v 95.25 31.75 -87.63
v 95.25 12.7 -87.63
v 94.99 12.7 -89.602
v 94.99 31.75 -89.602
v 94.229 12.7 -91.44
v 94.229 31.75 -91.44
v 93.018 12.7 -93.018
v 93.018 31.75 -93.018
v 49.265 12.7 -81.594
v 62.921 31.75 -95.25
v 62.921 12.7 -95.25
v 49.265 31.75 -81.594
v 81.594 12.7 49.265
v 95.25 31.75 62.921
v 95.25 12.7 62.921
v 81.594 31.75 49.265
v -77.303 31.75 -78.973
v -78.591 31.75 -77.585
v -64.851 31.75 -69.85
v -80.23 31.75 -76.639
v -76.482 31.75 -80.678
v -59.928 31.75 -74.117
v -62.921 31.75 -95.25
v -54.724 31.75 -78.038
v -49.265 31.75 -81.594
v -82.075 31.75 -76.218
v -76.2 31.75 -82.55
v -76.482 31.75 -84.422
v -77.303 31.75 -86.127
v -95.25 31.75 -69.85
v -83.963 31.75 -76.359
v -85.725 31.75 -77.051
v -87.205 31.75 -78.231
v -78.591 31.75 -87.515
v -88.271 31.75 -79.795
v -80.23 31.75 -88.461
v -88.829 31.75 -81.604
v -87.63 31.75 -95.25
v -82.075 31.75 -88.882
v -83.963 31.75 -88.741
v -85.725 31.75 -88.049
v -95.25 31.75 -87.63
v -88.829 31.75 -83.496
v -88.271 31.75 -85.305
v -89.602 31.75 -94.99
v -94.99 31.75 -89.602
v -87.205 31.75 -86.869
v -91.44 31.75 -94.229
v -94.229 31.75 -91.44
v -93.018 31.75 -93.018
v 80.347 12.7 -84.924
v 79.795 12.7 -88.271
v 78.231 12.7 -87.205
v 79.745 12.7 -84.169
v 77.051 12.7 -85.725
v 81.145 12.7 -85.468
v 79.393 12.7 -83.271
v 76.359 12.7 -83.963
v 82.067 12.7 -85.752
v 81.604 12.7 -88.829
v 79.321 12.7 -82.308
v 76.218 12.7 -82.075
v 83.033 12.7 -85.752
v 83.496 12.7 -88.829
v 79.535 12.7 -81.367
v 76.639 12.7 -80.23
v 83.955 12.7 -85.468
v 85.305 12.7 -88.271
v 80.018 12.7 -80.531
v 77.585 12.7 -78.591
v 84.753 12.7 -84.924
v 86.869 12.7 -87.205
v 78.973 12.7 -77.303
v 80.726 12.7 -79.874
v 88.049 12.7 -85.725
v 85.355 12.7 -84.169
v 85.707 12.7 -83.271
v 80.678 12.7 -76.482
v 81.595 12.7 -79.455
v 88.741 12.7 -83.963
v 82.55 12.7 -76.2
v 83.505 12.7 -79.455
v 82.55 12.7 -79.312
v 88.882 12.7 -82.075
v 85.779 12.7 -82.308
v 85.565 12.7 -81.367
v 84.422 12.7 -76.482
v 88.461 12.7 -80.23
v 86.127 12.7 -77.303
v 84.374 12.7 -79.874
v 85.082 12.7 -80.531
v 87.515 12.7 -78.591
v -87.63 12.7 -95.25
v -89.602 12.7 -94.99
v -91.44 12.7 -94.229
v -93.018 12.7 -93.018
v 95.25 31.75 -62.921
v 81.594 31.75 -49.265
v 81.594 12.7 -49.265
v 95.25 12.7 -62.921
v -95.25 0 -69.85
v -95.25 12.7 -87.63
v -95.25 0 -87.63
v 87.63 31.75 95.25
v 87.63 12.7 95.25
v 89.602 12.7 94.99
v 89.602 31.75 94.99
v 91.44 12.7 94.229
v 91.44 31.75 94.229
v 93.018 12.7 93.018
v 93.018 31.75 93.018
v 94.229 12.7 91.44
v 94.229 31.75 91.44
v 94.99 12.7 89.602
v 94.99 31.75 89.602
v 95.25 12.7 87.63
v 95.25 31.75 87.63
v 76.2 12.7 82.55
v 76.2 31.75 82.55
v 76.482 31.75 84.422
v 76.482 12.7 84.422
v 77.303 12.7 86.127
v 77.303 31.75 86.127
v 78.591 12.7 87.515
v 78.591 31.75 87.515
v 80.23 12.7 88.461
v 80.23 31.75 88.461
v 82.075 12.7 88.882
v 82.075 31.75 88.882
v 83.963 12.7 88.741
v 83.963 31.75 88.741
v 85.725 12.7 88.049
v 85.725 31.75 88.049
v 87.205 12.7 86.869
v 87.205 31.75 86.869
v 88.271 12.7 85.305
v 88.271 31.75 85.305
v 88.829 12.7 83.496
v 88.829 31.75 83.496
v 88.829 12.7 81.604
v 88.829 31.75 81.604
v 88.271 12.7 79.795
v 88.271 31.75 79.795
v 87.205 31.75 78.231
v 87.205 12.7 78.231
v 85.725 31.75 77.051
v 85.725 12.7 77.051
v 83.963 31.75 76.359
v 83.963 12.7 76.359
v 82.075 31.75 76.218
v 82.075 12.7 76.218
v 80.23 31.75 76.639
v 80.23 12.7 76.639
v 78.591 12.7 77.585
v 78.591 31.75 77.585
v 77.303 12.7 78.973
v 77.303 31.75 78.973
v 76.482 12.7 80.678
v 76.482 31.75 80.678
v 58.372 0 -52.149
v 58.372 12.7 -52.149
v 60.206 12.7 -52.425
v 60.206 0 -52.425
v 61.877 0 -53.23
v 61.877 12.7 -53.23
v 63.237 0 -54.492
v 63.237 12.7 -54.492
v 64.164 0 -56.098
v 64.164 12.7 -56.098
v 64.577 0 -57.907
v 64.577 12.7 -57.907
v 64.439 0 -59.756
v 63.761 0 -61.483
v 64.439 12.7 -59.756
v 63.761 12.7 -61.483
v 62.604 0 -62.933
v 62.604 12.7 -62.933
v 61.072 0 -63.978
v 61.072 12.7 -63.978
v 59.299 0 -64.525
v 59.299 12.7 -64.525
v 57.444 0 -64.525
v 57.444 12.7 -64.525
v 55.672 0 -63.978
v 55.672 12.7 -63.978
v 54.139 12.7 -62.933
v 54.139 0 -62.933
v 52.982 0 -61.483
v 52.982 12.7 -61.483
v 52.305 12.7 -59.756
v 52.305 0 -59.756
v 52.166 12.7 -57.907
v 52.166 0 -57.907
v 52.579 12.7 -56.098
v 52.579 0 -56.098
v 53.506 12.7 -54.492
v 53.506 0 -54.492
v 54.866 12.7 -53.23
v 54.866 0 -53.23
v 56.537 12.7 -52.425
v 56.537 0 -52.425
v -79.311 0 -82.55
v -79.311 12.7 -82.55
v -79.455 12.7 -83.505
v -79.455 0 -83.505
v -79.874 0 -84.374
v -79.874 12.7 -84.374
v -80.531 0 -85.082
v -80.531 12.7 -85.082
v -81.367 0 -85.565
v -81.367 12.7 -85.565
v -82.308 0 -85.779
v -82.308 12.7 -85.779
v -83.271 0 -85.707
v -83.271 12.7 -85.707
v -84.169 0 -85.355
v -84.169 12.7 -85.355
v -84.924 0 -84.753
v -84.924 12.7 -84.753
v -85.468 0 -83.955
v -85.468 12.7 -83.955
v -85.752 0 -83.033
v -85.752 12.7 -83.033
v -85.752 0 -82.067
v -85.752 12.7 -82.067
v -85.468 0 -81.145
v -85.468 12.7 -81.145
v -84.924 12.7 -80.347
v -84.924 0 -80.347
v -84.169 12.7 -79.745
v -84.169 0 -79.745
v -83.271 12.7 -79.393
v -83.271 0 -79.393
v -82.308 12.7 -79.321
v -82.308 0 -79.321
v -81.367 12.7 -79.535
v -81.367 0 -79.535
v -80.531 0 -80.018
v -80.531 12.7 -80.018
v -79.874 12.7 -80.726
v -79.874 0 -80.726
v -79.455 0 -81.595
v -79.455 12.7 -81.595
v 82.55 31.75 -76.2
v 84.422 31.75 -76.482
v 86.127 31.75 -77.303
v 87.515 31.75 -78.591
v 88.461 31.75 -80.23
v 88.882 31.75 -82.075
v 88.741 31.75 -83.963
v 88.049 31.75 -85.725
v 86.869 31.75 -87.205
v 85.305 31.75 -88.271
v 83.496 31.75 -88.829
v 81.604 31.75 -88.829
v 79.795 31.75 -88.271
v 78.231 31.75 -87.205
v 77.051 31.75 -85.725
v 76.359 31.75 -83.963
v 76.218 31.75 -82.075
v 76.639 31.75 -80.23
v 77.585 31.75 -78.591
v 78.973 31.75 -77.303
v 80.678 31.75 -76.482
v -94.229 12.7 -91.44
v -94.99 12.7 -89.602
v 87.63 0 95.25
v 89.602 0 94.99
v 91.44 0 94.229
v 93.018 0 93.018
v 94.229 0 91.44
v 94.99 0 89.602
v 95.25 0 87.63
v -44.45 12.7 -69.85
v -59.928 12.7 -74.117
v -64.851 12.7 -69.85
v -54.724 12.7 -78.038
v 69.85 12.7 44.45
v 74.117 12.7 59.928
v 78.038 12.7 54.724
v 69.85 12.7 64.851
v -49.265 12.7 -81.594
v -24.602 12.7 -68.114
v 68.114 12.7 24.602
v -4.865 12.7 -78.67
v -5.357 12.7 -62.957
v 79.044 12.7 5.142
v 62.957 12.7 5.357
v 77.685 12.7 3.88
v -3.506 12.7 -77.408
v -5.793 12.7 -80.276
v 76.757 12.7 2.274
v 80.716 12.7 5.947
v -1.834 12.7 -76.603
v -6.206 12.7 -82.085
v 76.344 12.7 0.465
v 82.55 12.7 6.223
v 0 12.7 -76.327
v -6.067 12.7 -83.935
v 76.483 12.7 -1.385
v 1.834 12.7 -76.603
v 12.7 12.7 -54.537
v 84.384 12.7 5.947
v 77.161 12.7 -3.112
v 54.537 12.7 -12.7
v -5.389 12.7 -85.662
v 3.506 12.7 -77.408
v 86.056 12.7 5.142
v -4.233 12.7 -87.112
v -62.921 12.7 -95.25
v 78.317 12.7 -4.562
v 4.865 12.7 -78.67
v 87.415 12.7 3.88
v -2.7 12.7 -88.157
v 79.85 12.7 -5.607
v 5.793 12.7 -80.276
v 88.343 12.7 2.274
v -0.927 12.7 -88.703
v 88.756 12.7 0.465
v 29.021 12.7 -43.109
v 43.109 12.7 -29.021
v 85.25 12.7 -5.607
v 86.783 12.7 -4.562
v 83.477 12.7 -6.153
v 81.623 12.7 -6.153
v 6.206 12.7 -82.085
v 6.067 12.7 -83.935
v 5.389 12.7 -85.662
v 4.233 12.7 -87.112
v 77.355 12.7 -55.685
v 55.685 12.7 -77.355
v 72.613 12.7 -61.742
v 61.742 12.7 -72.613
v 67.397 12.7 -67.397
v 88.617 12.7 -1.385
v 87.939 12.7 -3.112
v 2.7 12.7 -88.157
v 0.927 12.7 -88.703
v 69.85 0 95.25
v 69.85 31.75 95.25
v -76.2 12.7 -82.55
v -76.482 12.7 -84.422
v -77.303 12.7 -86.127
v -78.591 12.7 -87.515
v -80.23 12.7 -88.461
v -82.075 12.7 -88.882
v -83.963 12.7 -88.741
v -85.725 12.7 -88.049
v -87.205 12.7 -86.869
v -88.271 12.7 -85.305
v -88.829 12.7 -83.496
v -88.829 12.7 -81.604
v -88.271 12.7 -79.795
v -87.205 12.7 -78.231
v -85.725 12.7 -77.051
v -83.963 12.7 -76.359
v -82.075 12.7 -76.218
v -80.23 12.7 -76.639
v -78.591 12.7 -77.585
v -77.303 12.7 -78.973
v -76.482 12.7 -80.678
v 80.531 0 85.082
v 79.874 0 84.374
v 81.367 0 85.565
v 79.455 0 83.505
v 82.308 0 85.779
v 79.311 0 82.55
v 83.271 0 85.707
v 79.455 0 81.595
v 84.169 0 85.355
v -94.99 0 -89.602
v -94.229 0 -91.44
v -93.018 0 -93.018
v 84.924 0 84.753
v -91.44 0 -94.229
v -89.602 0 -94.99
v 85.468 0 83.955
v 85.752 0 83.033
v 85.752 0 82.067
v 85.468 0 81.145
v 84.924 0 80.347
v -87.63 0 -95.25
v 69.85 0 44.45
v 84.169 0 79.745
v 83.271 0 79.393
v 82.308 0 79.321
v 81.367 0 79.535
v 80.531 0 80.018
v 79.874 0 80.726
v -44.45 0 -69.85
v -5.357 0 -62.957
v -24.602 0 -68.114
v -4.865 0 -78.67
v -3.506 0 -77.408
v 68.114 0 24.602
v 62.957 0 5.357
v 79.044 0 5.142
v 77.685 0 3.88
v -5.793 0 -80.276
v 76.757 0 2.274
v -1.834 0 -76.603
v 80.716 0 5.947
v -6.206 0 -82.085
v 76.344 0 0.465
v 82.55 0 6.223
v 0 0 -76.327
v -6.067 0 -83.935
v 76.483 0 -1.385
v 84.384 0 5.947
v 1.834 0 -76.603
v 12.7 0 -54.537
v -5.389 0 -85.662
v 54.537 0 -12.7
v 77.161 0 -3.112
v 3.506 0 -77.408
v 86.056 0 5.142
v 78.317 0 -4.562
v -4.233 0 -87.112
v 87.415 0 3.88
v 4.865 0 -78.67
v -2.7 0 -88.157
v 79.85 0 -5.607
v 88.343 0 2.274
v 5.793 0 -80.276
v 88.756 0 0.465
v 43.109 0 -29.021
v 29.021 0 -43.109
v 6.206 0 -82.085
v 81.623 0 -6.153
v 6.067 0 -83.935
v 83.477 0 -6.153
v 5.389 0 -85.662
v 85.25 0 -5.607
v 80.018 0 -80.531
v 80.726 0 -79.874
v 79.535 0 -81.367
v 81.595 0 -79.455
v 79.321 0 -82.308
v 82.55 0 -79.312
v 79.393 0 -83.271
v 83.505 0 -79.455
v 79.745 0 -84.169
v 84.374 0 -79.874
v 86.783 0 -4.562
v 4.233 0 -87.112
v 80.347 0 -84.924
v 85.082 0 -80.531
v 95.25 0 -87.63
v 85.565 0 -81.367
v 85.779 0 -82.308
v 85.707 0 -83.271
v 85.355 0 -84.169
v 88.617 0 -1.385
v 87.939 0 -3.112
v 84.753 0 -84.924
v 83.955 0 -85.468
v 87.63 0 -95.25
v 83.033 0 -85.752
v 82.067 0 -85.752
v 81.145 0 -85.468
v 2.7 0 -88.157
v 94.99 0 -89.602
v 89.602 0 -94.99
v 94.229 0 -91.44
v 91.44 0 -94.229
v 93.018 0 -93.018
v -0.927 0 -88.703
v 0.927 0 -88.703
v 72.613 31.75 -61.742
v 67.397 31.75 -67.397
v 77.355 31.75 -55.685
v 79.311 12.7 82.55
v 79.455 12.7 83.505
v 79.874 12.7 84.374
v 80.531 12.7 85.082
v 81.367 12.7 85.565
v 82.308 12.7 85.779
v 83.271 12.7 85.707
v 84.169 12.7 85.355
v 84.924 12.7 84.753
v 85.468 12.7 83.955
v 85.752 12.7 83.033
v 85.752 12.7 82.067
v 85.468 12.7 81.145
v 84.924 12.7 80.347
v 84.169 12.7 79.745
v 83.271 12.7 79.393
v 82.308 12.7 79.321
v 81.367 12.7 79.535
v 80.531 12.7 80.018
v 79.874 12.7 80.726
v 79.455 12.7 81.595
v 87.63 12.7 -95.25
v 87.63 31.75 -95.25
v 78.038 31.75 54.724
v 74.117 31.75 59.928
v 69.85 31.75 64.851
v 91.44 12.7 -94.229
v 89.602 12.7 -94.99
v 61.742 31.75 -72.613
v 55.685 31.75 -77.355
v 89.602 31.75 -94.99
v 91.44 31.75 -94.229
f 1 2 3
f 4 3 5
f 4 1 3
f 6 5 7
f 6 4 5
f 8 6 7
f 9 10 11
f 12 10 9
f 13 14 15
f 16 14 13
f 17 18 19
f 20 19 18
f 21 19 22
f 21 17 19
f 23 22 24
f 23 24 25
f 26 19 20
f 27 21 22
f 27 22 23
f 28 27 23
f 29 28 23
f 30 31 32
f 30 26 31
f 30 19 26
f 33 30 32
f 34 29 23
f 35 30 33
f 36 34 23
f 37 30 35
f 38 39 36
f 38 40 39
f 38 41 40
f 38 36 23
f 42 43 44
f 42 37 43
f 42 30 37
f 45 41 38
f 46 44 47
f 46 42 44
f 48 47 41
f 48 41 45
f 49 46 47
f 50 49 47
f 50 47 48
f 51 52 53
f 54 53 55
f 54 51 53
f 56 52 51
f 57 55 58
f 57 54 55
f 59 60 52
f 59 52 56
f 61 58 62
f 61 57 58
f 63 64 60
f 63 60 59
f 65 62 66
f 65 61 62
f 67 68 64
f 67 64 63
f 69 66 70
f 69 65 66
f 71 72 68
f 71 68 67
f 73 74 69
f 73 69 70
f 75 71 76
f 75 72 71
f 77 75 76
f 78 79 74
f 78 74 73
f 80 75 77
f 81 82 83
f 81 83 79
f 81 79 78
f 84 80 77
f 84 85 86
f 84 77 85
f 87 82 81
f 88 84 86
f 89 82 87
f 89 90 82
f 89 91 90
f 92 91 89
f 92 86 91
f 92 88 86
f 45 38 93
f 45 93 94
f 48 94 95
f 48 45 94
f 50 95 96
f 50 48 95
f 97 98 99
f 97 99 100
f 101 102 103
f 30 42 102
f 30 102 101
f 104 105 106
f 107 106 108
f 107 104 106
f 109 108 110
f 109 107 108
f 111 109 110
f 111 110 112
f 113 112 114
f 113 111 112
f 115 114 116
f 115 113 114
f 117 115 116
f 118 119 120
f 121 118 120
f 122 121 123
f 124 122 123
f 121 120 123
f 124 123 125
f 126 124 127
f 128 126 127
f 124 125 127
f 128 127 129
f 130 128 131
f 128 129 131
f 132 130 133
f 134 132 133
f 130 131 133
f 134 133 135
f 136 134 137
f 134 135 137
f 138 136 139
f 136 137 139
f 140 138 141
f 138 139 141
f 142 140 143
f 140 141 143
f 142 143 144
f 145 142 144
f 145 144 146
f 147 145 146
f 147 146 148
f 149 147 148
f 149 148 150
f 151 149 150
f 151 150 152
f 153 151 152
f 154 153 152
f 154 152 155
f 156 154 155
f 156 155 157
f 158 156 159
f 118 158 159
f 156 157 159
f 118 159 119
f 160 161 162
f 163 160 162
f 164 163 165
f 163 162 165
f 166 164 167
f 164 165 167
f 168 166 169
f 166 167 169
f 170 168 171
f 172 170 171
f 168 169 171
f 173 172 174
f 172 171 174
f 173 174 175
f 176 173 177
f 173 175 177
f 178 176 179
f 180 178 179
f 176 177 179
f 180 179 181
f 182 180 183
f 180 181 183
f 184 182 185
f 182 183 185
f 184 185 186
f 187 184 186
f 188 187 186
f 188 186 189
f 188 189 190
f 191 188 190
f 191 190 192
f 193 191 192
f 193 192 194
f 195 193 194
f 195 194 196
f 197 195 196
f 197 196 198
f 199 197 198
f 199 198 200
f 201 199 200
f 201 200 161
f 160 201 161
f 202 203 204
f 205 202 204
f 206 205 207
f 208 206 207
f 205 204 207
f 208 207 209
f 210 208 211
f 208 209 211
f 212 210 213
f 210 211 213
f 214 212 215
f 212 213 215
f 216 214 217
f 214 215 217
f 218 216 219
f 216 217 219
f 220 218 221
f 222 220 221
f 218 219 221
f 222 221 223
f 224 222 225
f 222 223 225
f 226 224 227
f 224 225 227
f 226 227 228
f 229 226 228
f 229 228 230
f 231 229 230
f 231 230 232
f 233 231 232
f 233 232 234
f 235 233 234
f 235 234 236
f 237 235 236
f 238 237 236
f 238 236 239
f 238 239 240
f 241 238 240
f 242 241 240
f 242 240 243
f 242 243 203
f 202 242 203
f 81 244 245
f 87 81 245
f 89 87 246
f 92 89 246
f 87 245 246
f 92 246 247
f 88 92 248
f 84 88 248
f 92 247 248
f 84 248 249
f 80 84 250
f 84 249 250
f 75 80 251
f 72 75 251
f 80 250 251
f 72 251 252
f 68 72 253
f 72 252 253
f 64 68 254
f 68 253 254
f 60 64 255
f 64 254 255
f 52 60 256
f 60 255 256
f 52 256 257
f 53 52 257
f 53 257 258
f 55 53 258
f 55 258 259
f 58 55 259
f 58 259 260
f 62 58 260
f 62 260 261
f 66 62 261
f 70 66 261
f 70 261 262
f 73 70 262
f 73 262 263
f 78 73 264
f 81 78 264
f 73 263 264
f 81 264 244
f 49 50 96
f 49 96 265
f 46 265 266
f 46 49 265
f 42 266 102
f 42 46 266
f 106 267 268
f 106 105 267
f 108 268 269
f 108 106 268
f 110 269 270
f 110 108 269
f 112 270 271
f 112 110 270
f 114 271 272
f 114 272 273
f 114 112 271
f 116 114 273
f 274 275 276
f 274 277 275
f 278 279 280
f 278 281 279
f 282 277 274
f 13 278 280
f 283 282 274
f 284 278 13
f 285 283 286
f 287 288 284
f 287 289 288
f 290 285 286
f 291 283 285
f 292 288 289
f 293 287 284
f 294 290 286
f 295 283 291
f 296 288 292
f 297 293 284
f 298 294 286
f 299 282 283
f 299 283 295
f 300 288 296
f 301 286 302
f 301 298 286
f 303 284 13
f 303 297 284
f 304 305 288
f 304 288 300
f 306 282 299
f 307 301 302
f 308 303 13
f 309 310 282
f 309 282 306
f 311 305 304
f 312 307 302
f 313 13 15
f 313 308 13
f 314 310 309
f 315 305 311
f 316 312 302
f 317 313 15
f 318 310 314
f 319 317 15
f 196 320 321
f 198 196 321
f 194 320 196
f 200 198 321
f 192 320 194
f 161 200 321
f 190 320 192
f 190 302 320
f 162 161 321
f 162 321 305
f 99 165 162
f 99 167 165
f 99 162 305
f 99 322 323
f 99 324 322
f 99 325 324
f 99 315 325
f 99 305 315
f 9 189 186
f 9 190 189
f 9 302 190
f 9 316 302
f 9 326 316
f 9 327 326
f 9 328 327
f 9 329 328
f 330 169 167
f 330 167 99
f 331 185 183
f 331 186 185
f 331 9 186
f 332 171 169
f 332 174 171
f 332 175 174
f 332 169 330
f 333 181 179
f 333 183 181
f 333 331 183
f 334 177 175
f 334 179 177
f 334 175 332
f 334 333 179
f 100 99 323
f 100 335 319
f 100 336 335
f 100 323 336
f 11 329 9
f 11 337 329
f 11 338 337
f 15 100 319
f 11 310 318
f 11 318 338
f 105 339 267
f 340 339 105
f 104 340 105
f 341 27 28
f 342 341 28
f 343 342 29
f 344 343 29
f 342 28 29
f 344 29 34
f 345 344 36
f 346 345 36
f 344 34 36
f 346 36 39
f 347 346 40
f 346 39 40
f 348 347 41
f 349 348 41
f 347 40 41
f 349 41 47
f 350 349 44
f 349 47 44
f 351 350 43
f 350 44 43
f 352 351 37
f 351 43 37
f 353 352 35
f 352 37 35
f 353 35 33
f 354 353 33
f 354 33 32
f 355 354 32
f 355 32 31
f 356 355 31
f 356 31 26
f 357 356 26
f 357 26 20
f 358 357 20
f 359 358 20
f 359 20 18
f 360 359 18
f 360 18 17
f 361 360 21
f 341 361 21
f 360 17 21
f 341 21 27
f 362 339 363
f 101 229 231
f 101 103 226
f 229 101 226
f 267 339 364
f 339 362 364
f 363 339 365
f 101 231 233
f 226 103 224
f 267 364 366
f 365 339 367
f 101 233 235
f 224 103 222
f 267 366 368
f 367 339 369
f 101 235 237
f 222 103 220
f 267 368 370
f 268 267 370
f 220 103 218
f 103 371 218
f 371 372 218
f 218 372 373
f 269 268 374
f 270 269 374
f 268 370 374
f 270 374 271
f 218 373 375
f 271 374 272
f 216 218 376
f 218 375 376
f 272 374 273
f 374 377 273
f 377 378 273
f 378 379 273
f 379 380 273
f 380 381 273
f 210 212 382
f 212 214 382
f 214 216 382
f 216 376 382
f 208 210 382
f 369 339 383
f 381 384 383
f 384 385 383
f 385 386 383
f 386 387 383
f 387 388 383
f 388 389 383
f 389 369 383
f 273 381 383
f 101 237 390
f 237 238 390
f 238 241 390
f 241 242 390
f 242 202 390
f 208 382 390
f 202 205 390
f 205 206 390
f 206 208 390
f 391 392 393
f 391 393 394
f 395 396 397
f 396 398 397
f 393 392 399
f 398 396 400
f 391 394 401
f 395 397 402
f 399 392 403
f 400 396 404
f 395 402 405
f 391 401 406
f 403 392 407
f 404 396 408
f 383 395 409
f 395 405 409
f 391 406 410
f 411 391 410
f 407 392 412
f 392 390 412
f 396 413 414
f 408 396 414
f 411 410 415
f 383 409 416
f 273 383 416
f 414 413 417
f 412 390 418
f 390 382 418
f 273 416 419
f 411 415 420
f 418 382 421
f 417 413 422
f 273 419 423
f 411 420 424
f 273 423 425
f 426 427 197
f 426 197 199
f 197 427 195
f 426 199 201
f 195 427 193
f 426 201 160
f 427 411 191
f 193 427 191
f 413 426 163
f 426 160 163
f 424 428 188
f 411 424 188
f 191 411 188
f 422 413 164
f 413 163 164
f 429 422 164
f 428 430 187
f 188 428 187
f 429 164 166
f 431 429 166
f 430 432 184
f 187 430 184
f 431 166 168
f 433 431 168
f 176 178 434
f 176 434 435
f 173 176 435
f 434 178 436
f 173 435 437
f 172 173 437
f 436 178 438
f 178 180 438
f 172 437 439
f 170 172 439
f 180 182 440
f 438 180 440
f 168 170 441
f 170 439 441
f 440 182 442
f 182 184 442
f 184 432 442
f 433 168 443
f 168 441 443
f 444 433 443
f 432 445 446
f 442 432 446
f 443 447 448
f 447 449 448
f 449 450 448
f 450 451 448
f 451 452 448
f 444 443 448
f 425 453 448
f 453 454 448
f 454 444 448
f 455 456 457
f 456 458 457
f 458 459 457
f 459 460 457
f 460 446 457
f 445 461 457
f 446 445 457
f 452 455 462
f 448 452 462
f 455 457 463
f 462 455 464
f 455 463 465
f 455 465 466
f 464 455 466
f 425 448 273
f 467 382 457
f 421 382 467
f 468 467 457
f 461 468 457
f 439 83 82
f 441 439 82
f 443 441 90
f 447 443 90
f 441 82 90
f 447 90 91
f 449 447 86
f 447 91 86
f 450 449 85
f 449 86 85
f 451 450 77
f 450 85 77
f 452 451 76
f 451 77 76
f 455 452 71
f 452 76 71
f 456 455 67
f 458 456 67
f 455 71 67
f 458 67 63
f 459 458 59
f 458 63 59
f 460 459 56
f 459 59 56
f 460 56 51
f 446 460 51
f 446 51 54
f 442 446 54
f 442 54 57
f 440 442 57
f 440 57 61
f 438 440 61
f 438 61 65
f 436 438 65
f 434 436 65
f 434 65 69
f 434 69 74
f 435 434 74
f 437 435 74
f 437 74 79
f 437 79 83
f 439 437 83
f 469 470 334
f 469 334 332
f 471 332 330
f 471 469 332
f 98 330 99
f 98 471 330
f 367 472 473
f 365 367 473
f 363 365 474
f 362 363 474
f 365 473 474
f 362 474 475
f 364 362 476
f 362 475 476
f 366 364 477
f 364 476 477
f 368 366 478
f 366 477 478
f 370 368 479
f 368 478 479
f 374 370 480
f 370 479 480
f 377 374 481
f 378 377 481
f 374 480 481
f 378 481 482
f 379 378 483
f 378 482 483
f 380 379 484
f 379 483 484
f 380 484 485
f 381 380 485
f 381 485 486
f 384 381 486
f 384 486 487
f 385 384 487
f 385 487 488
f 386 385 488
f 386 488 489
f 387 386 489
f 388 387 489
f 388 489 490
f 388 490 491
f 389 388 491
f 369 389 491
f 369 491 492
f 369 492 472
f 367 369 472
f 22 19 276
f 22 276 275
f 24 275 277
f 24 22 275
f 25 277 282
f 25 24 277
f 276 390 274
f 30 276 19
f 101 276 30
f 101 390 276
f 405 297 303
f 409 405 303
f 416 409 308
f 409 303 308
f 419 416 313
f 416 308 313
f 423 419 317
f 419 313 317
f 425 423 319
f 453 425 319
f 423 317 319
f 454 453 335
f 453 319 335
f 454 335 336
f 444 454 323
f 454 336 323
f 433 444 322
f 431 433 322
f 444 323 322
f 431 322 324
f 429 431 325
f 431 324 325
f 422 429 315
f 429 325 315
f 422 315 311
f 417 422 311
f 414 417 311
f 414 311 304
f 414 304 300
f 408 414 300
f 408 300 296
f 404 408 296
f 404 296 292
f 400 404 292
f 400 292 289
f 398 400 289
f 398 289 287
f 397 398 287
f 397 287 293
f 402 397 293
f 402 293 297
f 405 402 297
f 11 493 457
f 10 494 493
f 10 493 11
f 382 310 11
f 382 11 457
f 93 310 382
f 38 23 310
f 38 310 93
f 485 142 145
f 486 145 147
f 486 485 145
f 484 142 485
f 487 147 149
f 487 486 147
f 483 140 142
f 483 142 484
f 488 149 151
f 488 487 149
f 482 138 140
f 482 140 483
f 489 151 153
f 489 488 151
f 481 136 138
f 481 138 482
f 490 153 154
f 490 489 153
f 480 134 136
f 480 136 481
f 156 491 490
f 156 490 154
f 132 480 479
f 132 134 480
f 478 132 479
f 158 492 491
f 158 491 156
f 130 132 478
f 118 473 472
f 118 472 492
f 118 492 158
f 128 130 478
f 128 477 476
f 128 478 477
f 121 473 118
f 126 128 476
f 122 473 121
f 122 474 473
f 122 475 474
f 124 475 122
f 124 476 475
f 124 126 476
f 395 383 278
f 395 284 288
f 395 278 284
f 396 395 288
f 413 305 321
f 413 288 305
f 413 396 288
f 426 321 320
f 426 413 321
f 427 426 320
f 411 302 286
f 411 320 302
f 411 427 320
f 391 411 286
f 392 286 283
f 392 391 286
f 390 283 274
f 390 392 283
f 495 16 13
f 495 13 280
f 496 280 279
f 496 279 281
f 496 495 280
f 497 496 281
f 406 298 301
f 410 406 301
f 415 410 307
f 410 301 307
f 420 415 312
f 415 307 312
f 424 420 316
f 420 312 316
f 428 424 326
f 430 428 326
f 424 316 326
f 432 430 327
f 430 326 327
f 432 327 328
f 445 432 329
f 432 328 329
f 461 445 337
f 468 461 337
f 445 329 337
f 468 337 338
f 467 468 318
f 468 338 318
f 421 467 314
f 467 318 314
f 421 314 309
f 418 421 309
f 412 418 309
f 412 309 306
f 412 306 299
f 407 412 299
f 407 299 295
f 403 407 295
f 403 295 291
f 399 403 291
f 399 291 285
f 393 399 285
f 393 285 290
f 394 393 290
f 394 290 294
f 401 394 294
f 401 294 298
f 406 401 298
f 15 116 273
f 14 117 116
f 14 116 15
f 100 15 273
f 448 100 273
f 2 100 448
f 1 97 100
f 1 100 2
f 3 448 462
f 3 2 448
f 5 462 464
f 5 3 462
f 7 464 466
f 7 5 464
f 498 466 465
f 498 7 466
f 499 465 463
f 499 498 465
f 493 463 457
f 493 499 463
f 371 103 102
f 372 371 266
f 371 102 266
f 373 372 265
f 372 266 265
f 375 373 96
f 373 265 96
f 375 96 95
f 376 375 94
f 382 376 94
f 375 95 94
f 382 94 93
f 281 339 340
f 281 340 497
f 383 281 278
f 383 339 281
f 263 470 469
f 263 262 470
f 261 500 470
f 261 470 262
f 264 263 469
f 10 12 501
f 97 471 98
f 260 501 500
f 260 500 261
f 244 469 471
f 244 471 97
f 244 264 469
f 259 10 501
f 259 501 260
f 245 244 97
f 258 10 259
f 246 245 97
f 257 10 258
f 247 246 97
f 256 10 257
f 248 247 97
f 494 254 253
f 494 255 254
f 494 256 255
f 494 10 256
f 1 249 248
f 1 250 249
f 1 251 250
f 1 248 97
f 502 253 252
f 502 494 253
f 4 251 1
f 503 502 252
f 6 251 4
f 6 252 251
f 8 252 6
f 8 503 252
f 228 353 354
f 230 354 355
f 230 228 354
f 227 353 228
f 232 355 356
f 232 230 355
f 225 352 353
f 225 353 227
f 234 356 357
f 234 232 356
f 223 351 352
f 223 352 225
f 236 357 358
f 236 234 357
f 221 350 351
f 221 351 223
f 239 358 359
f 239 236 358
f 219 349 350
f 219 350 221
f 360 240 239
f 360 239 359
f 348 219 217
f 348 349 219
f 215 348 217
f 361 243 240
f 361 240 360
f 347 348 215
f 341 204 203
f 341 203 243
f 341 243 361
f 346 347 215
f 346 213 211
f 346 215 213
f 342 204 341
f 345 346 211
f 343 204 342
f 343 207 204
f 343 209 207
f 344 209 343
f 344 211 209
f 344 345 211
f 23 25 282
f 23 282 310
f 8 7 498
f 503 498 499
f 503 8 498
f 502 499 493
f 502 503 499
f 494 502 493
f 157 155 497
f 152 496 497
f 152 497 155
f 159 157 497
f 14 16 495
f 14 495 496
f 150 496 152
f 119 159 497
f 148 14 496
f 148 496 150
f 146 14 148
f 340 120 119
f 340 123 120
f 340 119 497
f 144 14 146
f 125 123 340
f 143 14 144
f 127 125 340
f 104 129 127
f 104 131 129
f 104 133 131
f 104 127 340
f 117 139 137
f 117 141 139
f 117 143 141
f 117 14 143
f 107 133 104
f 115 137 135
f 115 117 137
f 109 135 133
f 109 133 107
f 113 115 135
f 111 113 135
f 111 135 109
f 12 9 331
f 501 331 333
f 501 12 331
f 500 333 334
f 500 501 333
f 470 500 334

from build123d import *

# Parameters (mm, degrees)
SKETCH1_W               = 190.5
SKETCH1_H               = 190.5
BOSS_EXTRUDE1_DEPTH     = 12.7
FILLET1_R               = 7.62
BOSS_EXTRUDE3_START     = 19.05
BOSS_EXTRUDE3_DEPTH     = 19.05
CIRPATTERN1_COUNT       = 4
SKETCH8_R               = 6.223
CUT_EXTRUDE2_DEPTH      = 25.4
CUT_EXTRUDE3_DEPTH      = 137.044211564
CUT_EXTRUDE3_DEPTH_BACK = 137.044211564
SKETCH10_R              = 6.223
FILLET2_R               = 12.7
SKETCH11_R              = 6.35
CUT_EXTRUDE4_DEPTH      = 19.05
SKETCH11_3_R            = 3.2385
CUT_EXTRUDE5_DEPTH      = 139.395041457
CIRPATTERN2_COUNT       = 4
CUT_EXTRUDE6_DEPTH      = 137.044211564
CUT_EXTRUDE6_DEPTH_BACK = 137.044211564
CUT_EXTRUDE7_DEPTH      = 137.044211564
CUT_EXTRUDE7_DEPTH_BACK = 137.044211564


with BuildPart() as part:
    # Sketch1 → Boss-Extrude1 (new body)
    with BuildSketch(Plane(origin=(0, 0, 0), x_dir=(1, 0, 0), z_dir=(0, 1, 0))):
        Rectangle(SKETCH1_W, SKETCH1_H)
    extrude(amount=BOSS_EXTRUDE1_DEPTH)

    # Fillet1
    fillet1_edges = [part.edges().sort_by_distance(p)[0] for p in [
        (95.25, 6.35, 95.25),
        (-95.25, 6.35, 95.25),
        (-95.25, 6.35, -95.25),
        (95.25, 6.35, -95.25),
    ]]
    fillet(fillet1_edges, radius=FILLET1_R)

    # Sketch7 → Boss-Extrude3 (add)
    with BuildSketch(Plane(origin=(0, 12.7, 0), x_dir=(1, 0, 0), z_dir=(0, 1, 0)).offset(BOSS_EXTRUDE3_START)):
        with BuildLine():
            Line((67.396822189, 67.396822189), (93.018153673, 93.018153673))
            ThreePointArc((93.018153673, 93.018153673), (90.546047755, 94.669962038), (87.63, 95.25))
            Line((87.63, 95.25), (62.921077964, 95.25))
            Line((62.921077964, 95.25), (49.265209936, 81.594131972))
            ThreePointArc((49.265209936, 81.594131972), (58.761367718, 75.045086089), (67.396822189, 67.396822189))
        make_face()
        with BuildLine():
            ThreePointArc((95.25, 87.63), (94.669962038, 90.546047755), (93.018153673, 93.018153673))
            Line((93.018153673, 93.018153673), (67.396822189, 67.396822189))
            ThreePointArc((67.396822189, 67.396822189), (75.045086089, 58.761367718), (81.594131972, 49.265209936))
            Line((81.594131972, 49.265209936), (95.25, 62.921077964))
            Line((95.25, 62.921077964), (95.25, 87.63))
        make_face()
    boss_extrude3 = extrude(amount=-BOSS_EXTRUDE3_DEPTH)

    # CirPattern1: Boss-Extrude3 ×4 about axis
    cirpattern1_axis = Axis((0, 0, 0), (0, 1, 0))
    for i in range(1, CIRPATTERN1_COUNT):
        add(boss_extrude3.rotate(cirpattern1_axis, i * 360 / CIRPATTERN1_COUNT))

    # Sketch8 → Cut-Extrude2 (cut)
    with BuildSketch(Plane(origin=(0, 12.7, 0), x_dir=(1, 0, 0), z_dir=(0, 1, 0))):
        with Locations(Location((0, 82.55, 0), (0, 0, 270))):
            Circle(SKETCH8_R)
        with Locations(Location((58.371664787, 58.371664787, 0), (0, 0, 270))):
            Circle(SKETCH8_R)
        with Locations(Location((82.55, 0, 0), (0, 0, 270))):
            Circle(SKETCH8_R)
        with Locations(Location((58.371664787, -58.371664787, 0), (0, 0, 270))):
            Circle(SKETCH8_R)
        with Locations(Location((0, -82.55, 0), (0, 0, 270))):
            Circle(SKETCH8_R)
        with Locations(Location((-58.371664787, -58.371664787, 0), (0, 0, 270))):
            Circle(SKETCH8_R)
        with Locations(Location((-82.55, 0, 0), (0, 0, 270))):
            Circle(SKETCH8_R)
        with Locations(Location((-58.371664787, 58.371664787, 0), (0, 0, 270))):
            Circle(SKETCH8_R)
    extrude(amount=-CUT_EXTRUDE2_DEPTH, mode=Mode.SUBTRACT)

    # Sketch10 → Cut-Extrude3 (cut, two sides: drawn at the far end of the back side and taken through both)
    # profile 1 of 2: a face of its own
    with BuildSketch(Plane(origin=(0, 12.7, 0), x_dir=(1, 0, 0), z_dir=(0, 1, 0)).offset(-CUT_EXTRUDE3_DEPTH_BACK)):
        Polygon((38.1, 38.1), (-95.25, 38.1), (-95.25, -38.1), (-38.1, -38.1), (-38.1, -95.25), (38.1, -95.25), align=None)
        with Locations((-82.55, 0)):
            Circle(SKETCH10_R, mode=Mode.SUBTRACT)
        with Locations((0, -82.55)):
            Circle(SKETCH10_R, mode=Mode.SUBTRACT)
    # profile 2 of 2: a face of its own
    with BuildSketch(Plane(origin=(0, 12.7, 0), x_dir=(1, 0, 0), z_dir=(0, 1, 0)).offset(-CUT_EXTRUDE3_DEPTH_BACK)):
        with BuildLine():
            Line((-38.1, -38.1), (-95.25, -38.1))
            Line((-95.25, -38.1), (-95.25, -62.921077964))
            Line((-95.25, -62.921077964), (-81.594131972, -49.265209936))
            ThreePointArc((-81.594131972, -49.265209936), (-67.396822189, -67.396822189), (-49.265209936, -81.594131972))
            Line((-49.265209936, -81.594131972), (-62.921077964, -95.25))
            Line((-62.921077964, -95.25), (-38.1, -95.25))
            Line((-38.1, -95.25), (-38.1, -38.1))
        make_face()
        with Locations((-58.371664787, -58.371664787)):
            Circle(SKETCH10_R, mode=Mode.SUBTRACT)
    extrude(amount=CUT_EXTRUDE3_DEPTH + CUT_EXTRUDE3_DEPTH_BACK, mode=Mode.SUBTRACT)


with BuildPart() as cut_extrude3_kept_piece:
    # of the separate pieces the step leaves, the one the design keeps (cut_extrude3_pieces_kept)
    add(part.part.solids().sort_by_distance((38.1, 0, 95.25))[0])

    # Fillet2
    fillet2_edges = [cut_extrude3_kept_piece.edges().sort_by_distance(p)[0] for p in [
        (-95.25, 6.35, -38.1),
        (38.1, 6.35, -38.1),
        (38.1, 6.35, 95.25),
    ]]
    fillet(fillet2_edges, radius=FILLET2_R)

    # Sketch11 → Cut-Extrude4 (cut)
    with BuildSketch(Plane(origin=(0, 31.75, 0), x_dir=(1, 0, 0), z_dir=(0, 1, 0))):
        with Locations(Location((82.55, 82.55, 0), (0, 0, 270))):
            Circle(SKETCH11_R)
    cut_extrude4 = extrude(amount=-CUT_EXTRUDE4_DEPTH, mode=Mode.SUBTRACT)

    # Sketch11<3> → Cut-Extrude5 (cut, through all)
    with BuildSketch(Plane(origin=(0, 31.75, 0), x_dir=(1, 0, 0), z_dir=(0, 1, 0))):
        with Locations(Location((82.55, 82.55, 0), (0, 0, 270))):
            Circle(SKETCH11_3_R)
    cut_extrude5 = extrude(amount=-CUT_EXTRUDE5_DEPTH, mode=Mode.SUBTRACT)

    # CirPattern2: Cut-Extrude4, Cut-Extrude5 ×4 about axis
    cirpattern2_axis = Axis((0, 0, 0), (0, 1, 0))
    add([cut_extrude4.rotate(cirpattern2_axis, i * 360 / CIRPATTERN2_COUNT) for i in range(1, CIRPATTERN2_COUNT)], mode=Mode.SUBTRACT)
    add([cut_extrude5.rotate(cirpattern2_axis, i * 360 / CIRPATTERN2_COUNT) for i in range(1, CIRPATTERN2_COUNT)], mode=Mode.SUBTRACT)

    # Sketch12 → Cut-Extrude6 (cut, two sides: drawn at the far end of the back side and taken through both)
    with BuildSketch(Plane(origin=(0, 12.7, 0), x_dir=(1, 0, 0), z_dir=(0, 1, 0)).offset(-CUT_EXTRUDE6_DEPTH_BACK)):
        Polygon((-95.25, -95.25), (69.85, -95.25), (69.85, -44.45), (-44.45, -44.45), (-44.45, 69.85), (-95.25, 69.85), align=None)
    extrude(amount=CUT_EXTRUDE6_DEPTH + CUT_EXTRUDE6_DEPTH_BACK, mode=Mode.SUBTRACT)

    # Sketch13 → Cut-Extrude7 (cut, two sides: drawn at the far end of the back side and taken through both)
    with BuildSketch(Plane(origin=(0, 12.7, 0), x_dir=(1, 0, 0), z_dir=(0, 1, 0)).offset(-CUT_EXTRUDE7_DEPTH_BACK)):
        with BuildLine():
            Line((-44.45, 69.85), (-44.45, -44.45))
            Line((-44.45, -44.45), (69.85, -44.45))
            ThreePointArc((69.85, -44.45), (36.37230509, 36.37230509), (-44.45, 69.85))
        make_face()
    extrude(amount=CUT_EXTRUDE7_DEPTH + CUT_EXTRUDE7_DEPTH_BACK, mode=Mode.SUBTRACT)


solid = cut_extrude3_kept_piece.part
